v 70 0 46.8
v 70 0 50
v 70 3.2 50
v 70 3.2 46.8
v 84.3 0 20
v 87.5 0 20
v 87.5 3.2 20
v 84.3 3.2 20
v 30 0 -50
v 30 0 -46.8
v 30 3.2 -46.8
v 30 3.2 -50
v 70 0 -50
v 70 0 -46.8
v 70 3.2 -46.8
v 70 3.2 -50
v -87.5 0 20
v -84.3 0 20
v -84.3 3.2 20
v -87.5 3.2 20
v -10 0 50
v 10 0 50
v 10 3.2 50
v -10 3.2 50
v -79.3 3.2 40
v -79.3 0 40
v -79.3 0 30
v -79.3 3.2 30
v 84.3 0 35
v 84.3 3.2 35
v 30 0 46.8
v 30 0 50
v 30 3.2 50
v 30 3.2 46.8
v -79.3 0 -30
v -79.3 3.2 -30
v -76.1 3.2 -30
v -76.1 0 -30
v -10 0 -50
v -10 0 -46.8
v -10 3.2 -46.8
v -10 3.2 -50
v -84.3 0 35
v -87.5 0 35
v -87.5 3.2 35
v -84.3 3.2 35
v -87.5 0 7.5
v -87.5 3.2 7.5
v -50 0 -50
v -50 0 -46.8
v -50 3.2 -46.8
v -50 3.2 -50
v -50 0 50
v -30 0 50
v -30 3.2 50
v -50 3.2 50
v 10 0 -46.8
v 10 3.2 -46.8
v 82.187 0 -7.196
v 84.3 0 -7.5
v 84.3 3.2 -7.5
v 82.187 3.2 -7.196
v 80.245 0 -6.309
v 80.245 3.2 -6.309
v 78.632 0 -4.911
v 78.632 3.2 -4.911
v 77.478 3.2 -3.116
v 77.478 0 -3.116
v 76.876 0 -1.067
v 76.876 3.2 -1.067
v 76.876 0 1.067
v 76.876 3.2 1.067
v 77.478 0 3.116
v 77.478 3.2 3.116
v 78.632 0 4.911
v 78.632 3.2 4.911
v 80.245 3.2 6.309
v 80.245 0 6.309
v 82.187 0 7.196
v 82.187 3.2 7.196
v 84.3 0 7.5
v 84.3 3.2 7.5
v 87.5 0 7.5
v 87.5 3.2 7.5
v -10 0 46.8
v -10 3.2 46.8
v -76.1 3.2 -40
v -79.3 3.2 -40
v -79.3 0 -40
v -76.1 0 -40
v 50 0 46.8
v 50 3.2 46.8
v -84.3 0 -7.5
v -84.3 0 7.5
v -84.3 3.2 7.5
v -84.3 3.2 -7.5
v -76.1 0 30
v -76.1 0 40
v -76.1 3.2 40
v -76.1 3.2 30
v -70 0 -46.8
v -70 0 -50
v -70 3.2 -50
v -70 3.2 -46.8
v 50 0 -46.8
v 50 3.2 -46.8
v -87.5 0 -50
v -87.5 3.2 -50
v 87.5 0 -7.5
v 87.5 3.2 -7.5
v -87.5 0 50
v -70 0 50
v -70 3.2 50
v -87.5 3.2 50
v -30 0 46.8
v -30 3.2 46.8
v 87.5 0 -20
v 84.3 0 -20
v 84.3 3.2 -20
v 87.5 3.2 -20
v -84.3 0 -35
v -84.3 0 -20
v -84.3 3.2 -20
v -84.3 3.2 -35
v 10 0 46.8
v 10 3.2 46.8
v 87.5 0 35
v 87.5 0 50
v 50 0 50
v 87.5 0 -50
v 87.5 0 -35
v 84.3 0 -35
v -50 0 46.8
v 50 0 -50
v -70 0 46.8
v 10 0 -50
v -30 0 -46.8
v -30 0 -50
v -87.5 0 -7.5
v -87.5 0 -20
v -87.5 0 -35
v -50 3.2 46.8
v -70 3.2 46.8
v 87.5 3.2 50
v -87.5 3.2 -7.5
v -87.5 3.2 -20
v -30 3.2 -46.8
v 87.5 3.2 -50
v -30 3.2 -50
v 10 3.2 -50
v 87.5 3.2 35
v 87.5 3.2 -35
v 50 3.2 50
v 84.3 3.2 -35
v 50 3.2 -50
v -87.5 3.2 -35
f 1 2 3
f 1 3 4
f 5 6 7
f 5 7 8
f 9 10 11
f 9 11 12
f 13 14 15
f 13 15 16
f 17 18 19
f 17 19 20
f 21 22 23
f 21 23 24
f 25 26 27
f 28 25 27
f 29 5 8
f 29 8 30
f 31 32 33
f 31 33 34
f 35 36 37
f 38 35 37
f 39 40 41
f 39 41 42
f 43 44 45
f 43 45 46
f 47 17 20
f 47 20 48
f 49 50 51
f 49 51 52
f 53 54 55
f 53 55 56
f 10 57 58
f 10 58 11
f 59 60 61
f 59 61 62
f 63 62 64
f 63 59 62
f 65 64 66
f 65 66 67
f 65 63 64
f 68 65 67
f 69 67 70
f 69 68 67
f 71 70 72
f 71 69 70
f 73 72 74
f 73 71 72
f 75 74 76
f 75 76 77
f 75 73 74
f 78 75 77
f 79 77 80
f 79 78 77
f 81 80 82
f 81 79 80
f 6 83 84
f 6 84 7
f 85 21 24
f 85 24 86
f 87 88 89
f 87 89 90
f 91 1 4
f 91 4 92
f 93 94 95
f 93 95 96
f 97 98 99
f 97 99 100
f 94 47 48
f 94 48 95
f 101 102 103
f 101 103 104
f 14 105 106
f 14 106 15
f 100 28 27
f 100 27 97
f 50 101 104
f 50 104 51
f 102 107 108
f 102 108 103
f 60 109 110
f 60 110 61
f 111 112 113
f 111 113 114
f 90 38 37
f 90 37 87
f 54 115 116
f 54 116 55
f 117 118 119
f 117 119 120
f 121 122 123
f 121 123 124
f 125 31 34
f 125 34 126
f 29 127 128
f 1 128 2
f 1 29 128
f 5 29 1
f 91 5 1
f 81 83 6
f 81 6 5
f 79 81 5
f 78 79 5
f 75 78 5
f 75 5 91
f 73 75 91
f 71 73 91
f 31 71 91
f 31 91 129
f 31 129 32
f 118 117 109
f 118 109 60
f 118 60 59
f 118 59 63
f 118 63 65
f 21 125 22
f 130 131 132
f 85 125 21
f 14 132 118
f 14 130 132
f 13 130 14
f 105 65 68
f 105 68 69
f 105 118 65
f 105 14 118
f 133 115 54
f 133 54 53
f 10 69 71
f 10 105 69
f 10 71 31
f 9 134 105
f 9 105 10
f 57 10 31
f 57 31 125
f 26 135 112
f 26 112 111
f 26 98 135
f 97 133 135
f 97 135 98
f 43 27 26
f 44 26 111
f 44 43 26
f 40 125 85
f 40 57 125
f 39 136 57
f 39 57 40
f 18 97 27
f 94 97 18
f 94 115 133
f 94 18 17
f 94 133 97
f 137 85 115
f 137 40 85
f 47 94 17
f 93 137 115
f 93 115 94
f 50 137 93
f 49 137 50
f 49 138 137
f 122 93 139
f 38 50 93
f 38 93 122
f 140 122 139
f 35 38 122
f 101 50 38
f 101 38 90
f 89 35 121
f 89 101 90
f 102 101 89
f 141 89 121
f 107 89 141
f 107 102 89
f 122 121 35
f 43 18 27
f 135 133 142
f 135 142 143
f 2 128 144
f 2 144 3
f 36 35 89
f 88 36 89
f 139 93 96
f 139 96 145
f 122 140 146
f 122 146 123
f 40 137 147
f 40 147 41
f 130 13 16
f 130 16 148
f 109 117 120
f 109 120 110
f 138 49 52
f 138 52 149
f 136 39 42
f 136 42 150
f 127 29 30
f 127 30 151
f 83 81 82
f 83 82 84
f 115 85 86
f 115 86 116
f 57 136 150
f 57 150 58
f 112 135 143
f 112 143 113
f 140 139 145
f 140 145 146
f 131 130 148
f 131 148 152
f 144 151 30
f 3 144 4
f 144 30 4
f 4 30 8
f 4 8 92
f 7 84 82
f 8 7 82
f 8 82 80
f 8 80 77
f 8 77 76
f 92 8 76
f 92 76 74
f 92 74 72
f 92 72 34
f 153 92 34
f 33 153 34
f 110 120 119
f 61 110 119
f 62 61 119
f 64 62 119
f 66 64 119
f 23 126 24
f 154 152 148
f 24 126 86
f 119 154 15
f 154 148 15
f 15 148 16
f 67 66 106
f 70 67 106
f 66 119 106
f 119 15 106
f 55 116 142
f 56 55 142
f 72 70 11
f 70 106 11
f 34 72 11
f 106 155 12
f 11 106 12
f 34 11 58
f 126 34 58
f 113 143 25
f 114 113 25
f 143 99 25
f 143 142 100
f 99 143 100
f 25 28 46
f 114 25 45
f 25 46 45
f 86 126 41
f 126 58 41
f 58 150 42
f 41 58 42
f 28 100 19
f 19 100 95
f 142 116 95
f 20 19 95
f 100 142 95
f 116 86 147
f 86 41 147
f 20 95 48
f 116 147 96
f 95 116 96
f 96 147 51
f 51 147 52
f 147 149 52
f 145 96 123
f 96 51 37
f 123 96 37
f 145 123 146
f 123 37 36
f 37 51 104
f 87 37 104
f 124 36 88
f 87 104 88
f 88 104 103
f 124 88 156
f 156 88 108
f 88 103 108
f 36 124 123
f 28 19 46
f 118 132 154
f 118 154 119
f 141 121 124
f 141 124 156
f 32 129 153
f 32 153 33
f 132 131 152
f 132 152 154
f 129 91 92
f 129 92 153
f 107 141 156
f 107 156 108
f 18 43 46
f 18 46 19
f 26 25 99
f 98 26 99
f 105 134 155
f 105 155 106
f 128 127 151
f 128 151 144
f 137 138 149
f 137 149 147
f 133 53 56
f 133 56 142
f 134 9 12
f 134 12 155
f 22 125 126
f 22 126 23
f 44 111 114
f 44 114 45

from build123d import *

# Parameters (mm, degrees)
SKETCH1_W           = 3.2
SKETCH1_H           = 10
BOSS_EXTRUDE1_DEPTH = 3.2


with BuildPart() as part:
    # Sketch1 → Boss-Extrude1 (new body)
    with BuildSketch(Plane(origin=(0, 0, 0), x_dir=(1, 0, 0), z_dir=(0, 1, 0))):
        with BuildLine():
            Line((-87.5, 7.5), (-87.5, 20))
            Line((-87.5, 20), (-84.3, 20))
            Line((-84.3, 20), (-84.3, 35))
            Line((-84.3, 35), (-87.5, 35))
            Line((-87.5, 35), (-87.5, 50))
            Line((-87.5, 50), (-70, 50))
            Line((-70, 50), (-70, 46.8))
            Line((-70, 46.8), (-50, 46.8))
            Line((-50, 46.8), (-50, 50))
            Line((-50, 50), (-30, 50))
            Line((-30, 50), (-30, 46.8))
            Line((-30, 46.8), (-10, 46.8))
            Line((-10, 46.8), (-10, 50))
            Line((-10, 50), (10, 50))
            Line((10, 50), (10, 46.8))
            Line((10, 46.8), (30, 46.8))
            Line((30, 46.8), (30, 50))
            Line((30, 50), (50, 50))
            Line((50, 50), (50, 46.8))
            Line((50, 46.8), (70, 46.8))
            Line((70, 46.8), (70, 50))
            Line((70, 50), (87.5, 50))
            Line((87.5, 50), (87.5, 35))
            Line((87.5, 35), (84.3, 35))
            Line((84.3, 35), (84.3, 20))
            Line((84.3, 20), (87.5, 20))
            Line((87.5, 20), (87.5, 7.5))
            Line((87.5, 7.5), (84.3, 7.5))
            ThreePointArc((84.3, 7.5), (76.8, 0), (84.3, -7.5))
            Line((84.3, -7.5), (87.5, -7.5))
            Line((87.5, -7.5), (87.5, -20))
            Line((87.5, -20), (84.3, -20))
            Line((84.3, -20), (84.3, -35))
            Line((84.3, -35), (87.5, -35))
            Line((87.5, -35), (87.5, -50))
            Line((87.5, -50), (70, -50))
            Line((70, -50), (70, -46.8))
            Line((70, -46.8), (50, -46.8))
            Line((50, -46.8), (50, -50))
            Line((50, -50), (30, -50))
            Line((30, -50), (30, -46.8))
            Line((30, -46.8), (10, -46.8))
            Line((10, -46.8), (10, -50))
            Line((10, -50), (-10, -50))
            Line((-10, -50), (-10, -46.8))
            Line((-10, -46.8), (-30, -46.8))
            Line((-30, -46.8), (-30, -50))
            Line((-30, -50), (-50, -50))
            Line((-50, -50), (-50, -46.8))
            Line((-50, -46.8), (-70, -46.8))
            Line((-70, -46.8), (-70, -50))
            Line((-70, -50), (-87.5, -50))
            Line((-87.5, -50), (-87.5, -35))
            Line((-87.5, -35), (-84.3, -35))
            Line((-84.3, -35), (-84.3, -20))
            Line((-84.3, -20), (-87.5, -20))
            Line((-87.5, -20), (-87.5, -7.5))
            Line((-87.5, -7.5), (-84.3, -7.5))
            Line((-84.3, -7.5), (-84.3, 7.5))
            Line((-84.3, 7.5), (-87.5, 7.5))
        make_face()
        with Locations((-77.7, 35)):
            Rectangle(SKETCH1_W, SKETCH1_H, mode=Mode.SUBTRACT)
        with Locations((-77.7, -35)):
            Rectangle(SKETCH1_W, SKETCH1_H, mode=Mode.SUBTRACT)
    extrude(amount=BOSS_EXTRUDE1_DEPTH)


solid = part.part
